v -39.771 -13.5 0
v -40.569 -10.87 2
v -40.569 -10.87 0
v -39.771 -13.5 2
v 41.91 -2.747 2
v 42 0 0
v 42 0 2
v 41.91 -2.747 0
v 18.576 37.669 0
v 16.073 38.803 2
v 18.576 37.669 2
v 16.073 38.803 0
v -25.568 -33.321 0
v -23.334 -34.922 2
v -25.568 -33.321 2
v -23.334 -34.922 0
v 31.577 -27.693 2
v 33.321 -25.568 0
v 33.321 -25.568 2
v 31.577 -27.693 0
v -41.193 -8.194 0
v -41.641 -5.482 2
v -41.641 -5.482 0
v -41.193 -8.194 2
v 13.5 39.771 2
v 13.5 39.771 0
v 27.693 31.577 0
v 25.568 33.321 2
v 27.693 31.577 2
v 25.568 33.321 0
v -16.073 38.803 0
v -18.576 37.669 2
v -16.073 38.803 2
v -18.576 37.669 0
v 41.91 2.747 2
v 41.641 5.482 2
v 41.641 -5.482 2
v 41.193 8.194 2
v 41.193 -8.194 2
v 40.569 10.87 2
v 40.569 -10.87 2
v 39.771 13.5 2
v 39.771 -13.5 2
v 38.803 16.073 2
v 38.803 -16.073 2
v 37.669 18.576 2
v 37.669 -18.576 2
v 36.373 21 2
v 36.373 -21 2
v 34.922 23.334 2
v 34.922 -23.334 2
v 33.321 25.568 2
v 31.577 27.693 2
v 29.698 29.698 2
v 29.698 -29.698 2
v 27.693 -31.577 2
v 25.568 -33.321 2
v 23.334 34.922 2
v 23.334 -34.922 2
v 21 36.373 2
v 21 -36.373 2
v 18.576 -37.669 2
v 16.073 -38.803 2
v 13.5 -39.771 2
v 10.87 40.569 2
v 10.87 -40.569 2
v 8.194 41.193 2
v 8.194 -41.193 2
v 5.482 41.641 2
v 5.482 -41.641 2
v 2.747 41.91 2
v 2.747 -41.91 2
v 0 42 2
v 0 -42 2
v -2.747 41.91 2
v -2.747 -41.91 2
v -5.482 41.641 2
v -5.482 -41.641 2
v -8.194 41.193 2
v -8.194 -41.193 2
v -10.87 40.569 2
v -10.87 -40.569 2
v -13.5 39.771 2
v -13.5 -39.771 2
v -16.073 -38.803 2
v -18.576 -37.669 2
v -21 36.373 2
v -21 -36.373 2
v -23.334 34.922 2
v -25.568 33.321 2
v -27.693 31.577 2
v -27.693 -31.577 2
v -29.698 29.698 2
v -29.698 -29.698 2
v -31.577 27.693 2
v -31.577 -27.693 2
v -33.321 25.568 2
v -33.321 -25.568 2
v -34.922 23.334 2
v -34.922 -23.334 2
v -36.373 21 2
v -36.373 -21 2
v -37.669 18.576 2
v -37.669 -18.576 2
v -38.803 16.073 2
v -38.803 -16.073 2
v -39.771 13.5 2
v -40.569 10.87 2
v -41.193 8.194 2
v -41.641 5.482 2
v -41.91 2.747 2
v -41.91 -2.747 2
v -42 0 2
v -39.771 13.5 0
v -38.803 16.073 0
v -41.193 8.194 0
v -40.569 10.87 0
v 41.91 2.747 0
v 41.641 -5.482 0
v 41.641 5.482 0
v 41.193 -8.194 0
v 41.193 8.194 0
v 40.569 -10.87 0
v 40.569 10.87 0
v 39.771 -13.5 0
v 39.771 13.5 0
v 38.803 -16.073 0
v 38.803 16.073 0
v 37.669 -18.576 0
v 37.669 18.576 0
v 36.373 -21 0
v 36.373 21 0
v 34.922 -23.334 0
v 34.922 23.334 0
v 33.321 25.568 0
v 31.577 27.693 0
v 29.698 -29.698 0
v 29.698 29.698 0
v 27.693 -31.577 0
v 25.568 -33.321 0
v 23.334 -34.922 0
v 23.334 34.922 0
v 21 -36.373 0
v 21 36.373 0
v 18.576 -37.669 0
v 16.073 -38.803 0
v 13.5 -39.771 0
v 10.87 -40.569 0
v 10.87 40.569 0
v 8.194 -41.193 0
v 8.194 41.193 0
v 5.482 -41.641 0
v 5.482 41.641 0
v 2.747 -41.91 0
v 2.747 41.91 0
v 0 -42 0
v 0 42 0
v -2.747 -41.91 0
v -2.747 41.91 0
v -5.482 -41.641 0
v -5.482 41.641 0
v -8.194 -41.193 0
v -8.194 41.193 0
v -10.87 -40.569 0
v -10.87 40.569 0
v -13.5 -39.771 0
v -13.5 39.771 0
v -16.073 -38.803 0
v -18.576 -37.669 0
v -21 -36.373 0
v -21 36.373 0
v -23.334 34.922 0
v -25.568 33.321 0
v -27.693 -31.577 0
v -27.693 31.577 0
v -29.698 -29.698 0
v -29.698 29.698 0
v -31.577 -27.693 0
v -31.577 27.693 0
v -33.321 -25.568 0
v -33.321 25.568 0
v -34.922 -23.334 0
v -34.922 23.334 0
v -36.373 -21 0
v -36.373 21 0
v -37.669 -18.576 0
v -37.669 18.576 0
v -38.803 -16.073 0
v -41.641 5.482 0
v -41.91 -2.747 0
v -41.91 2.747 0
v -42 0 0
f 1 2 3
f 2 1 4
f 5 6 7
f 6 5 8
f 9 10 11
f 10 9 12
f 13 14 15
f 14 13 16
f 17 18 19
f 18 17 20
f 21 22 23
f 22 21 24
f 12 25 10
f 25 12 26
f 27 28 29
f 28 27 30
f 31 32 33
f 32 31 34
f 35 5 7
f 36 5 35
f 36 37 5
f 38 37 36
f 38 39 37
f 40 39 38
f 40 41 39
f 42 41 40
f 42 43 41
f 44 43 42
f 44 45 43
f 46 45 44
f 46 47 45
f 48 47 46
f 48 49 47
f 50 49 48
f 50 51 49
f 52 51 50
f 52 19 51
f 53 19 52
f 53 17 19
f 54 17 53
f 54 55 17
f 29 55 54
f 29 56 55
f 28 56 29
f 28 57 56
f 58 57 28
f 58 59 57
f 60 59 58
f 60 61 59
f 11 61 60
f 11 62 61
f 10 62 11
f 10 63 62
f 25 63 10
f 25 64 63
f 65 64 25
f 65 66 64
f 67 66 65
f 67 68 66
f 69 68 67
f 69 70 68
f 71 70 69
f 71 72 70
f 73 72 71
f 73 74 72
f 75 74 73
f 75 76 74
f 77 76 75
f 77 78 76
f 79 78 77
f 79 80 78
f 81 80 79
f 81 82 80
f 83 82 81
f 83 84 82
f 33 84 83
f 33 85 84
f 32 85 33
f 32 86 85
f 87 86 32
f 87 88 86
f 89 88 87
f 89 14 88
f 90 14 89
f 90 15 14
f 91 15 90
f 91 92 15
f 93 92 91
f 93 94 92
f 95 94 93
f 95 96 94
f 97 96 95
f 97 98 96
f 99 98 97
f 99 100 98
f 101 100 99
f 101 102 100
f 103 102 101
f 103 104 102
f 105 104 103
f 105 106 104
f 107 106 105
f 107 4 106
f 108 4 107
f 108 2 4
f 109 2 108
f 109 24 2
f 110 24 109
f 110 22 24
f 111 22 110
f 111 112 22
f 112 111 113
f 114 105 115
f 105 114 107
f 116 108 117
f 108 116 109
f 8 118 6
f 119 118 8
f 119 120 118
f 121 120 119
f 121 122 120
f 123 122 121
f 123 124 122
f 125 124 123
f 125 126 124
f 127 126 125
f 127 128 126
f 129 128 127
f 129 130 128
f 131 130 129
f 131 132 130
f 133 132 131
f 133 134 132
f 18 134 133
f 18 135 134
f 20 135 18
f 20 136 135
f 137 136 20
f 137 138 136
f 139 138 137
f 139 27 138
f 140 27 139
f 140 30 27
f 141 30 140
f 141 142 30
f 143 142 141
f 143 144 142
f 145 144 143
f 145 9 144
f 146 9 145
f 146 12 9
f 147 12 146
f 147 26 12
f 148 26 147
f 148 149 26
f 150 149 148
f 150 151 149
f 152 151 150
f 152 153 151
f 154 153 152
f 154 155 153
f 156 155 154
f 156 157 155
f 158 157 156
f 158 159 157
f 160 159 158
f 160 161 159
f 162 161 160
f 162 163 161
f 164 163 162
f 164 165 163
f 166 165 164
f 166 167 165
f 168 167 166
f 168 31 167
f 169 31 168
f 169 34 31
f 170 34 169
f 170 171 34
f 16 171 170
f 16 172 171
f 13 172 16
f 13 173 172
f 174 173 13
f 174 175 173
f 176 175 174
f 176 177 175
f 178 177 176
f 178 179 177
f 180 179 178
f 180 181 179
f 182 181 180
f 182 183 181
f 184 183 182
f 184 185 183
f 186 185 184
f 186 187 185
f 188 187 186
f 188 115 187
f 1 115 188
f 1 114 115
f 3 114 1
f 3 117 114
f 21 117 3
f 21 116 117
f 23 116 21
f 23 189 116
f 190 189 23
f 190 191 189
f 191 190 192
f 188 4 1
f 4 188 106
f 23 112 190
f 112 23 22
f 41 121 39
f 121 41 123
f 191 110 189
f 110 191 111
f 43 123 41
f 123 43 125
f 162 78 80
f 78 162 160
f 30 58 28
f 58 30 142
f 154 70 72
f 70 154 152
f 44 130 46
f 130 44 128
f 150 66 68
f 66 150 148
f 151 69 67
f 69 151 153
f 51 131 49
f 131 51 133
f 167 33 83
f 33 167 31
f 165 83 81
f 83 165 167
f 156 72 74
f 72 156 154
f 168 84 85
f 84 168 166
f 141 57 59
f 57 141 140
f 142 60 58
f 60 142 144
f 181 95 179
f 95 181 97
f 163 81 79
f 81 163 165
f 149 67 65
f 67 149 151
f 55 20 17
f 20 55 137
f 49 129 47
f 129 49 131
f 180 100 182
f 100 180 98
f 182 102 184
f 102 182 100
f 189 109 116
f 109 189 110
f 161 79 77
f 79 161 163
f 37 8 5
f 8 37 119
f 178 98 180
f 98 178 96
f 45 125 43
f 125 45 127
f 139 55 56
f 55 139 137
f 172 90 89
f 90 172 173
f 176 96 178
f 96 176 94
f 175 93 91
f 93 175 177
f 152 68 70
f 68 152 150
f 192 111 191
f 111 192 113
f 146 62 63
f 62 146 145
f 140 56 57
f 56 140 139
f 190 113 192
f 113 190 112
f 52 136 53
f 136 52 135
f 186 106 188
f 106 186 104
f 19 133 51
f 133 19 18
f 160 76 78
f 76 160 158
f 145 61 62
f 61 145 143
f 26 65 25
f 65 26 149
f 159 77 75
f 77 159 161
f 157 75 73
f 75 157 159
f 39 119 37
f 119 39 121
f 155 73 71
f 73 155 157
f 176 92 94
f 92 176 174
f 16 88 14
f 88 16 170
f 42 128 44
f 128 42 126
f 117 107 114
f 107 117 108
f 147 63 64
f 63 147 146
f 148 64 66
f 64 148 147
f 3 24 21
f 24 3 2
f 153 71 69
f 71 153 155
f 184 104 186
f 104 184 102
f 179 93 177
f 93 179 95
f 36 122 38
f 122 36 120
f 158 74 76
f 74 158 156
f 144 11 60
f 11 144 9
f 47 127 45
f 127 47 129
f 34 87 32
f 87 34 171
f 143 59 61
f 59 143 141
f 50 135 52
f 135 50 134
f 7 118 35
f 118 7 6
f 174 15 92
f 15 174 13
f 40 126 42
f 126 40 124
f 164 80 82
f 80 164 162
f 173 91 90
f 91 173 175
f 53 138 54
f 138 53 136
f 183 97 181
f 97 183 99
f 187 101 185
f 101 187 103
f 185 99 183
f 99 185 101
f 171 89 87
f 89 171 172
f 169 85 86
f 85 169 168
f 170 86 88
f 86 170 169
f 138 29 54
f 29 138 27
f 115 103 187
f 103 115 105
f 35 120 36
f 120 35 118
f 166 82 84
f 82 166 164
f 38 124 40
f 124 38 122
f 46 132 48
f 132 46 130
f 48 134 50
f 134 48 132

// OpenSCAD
// file: random_maze_generator.scad
use <2d.scad>;

rows = 10; 
columns = 10; 
wall_thickness = 2;
wall_height = 5;
block_width = 5;


/*
 * constants, for clearness
 *
 */
 
// random directions, for picking up a direction to visit the next block
function PERMUTATION_OF_FOUR() = [
    [1, 2, 3, 4],
    [1, 2, 4, 3],
    [1, 3, 2, 4],
    [1, 3, 4, 2],
    [1, 4, 2, 3],
    [1, 4, 3, 2],
    [2, 1, 3, 4],
    [2, 1, 4, 3],
    [2, 3, 1, 4],
    [2, 3, 4, 1],
    [2, 4, 1, 3],
    [2, 4, 3, 1],
    [3, 1, 2, 4],
    [3, 1, 4, 2],
    [3, 2, 1, 4],
    [3, 2, 4, 1],
    [3, 4, 1, 2],
    [3, 4, 2, 1],
    [4, 1, 2, 3],
    [4, 1, 3, 2],
    [4, 2, 1, 3],
    [4, 2, 3, 1],
    [4, 3, 1, 2],
    [4, 3, 2, 1]
];

function NO_WALL() = 0;
function UP_WALL() = 1;
function RIGHT_WALL() = 2;
function UP_RIGHT_WALL() = 3;

function NOT_VISITED() = 0;
function VISITED() = 1;

/* 
 * modules for creating a maze
 *
 */

// create the outer wall of maze
module maze_outer_wall(rows, columns, block_width = 5, wall_thickness = 1) {
    x_line([0, rows * block_width], columns * block_width, wall_thickness);
    y_line([0, block_width], (rows - 1) * block_width, wall_thickness);
}

// create the inner wall of maze
module maze_inner_wall(maze, block_width = 5, wall_thickness = 1) {
    for(i = [0:len(maze) - 1]) {
        cord = maze[i];
        x = (cord[0] - 1) * block_width;
        y = (cord[1] - 1) * block_width;
        v = cord[3];
        
        if(v == 1 || v == 3) {
            x_line([x, y], block_width, wall_thickness);
        }
        if(v == 2 || v == 3) {
            y_line([x + block_width, y], block_width, wall_thickness);
        }
    }  
}

// create a maze
module maze(rows, columns, maze_vector, block_width = 5, wall_thickness = 1) {
     maze_outer_wall(rows, columns, block_width, wall_thickness);
     maze_inner_wall(maze_vector, block_width, wall_thickness);
}

/* 
 * utilities functions
 *
 */

// comare the equality of [x1, y1] and [x2, y2]
function cord_equals(cord1, cord2) = cord1 == cord2;

// is the point visited?
function not_visited(cord, vs, index = 0) =
    index == len(vs) ? true : 
        (cord_equals([vs[index][0], vs[index][1]], cord) && vs[index][2] == 1 ? false :
            not_visited(cord, vs, index + 1));
            
// pick a direction randomly
function rand_dirs() =
    PERMUTATION_OF_FOUR()[round(rands(0, 24, 1)[0])]; 

// give a index (exclusivly), slice a vector 
function head_to(i, vs) =
    i >= len(vs) ? vs : (
        i == 0 ? [] : concat(head_to(i - 1, vs), [vs[i - 1]])
    );

// give a index (exclusivly), slice a vector 
function tail_from(i, vs, index = 0, new_vs = []) =
    i >= len(vs) ? [] : (
        index < i ? tail_from(i, vs, index + 1) : (
            index < len(vs) ? tail_from(i, vs, index + 1, concat(new_vs, [vs[index]])) : new_vs
        )
    );

// replace v1 in the vector with v2 
function replace(v1, v2, vs, index = 0) =
    index == len(vs) ? vs : (
        vs[index] == v1 ? concat(concat(head_to(index, vs), [v2]), tail_from(index + 1, vs)) : replace(v1, v2, vs, index + 1)
    );
    
/* 
 * functions for generating a maze vector
 *
 */

// initialize rows of a maze
function init_row(n, length) =
    length == 0 ? [] : concat(init_row(n, length - 1), [[length, n, 0, UP_RIGHT_WALL()]]);
    
// initialize a maze
function init_maze(rows, columns) =
    rows == 0 ? [] : concat(init_maze(rows - 1, columns), init_row(rows, columns));
    
// find a vector in the maze vector
function find(i, j, maze_vector, index = 0) =
    index == len(maze_vector) ? [] : (
        cord_equals([i, j], [maze_vector[index][0], maze_vector[index][1]]) ? maze_vector[index] : find(i, j, maze_vector, index + 1)
    );

////
// NO_WALL = 0;
// UP_WALL = 1;
// RIGHT_WALL = 2;
// UP_RIGHT_WALL = 3;
function delete_right_wall(original_block) = 
    original_block == NO_WALL() || original_block == RIGHT_WALL() ? NO_WALL() : UP_WALL();

function delete_up_wall(original_block) = 
    (original_block == NO_WALL() || original_block == UP_WALL()) ? NO_WALL() : RIGHT_WALL();
    
function delete_right_wall_of(vs, is_visited, maze_vector) =
    replace(vs, [vs[0], vs[1] , is_visited, delete_right_wall(vs[3])] ,maze_vector);

function delete_up_wall_of(vs, is_visited, maze_vector) =
    replace(vs, [vs[0], vs[1] , is_visited, delete_up_wall(vs[3])] ,maze_vector);

function go_right(i, j, rows, columns, maze_vector) =
    go_maze(i + 1, j, rows, columns, delete_right_wall_of(find(i, j, maze_vector), VISITED(), maze_vector));
    
function go_up(i, j, rows, columns, maze_vector) =
    go_maze(i, j - 1, rows, columns, delete_up_wall_of(find(i, j, maze_vector), VISITED(), maze_vector));
    
function visit(v, maze_vector) =
    replace(v, [v[0], v[1], VISITED(), v[3]], maze_vector);
 
function go_left(i, j, rows, columns, maze_vector) =
    go_maze(i - 1, j, rows, columns, delete_right_wall_of(find(i - 1, j, maze_vector), NOT_VISITED(), maze_vector));
    
function go_down(i, j, rows, columns, maze_vector) =
    go_maze(i, j + 1, rows, columns, delete_up_wall_of(find(i, j + 1, maze_vector), NOT_VISITED(), maze_vector));
    
function go_maze(i, j, rows, columns, maze_vector) =
    look_around(i, j, rand_dirs(), rows, columns, visit(find(i, j, maze_vector), maze_vector));
    
function look_around(i, j, dirs, rows, columns, maze_vector, index = 0) =
    index == 4 ? maze_vector : 
        look_around( 
            i, j, dirs, 
            rows, columns, 
            build_wall(i, j, dirs[index], rows, columns, maze_vector), 
            index + 1
        ); 

function build_wall(i, j, n, rows, columns, maze_vector) = 
    n == 1 && i != columns && not_visited([i + 1, j], maze_vector) ? go_right(i, j, rows, columns, maze_vector) : ( 
        n == 2 && j != 1 && not_visited([i, j - 1], maze_vector) ? go_up(i, j, rows, columns, maze_vector)  : (
            n == 3 && i != 1 && not_visited([i - 1, j], maze_vector) ? go_left(i, j,rows, columns,  maze_vector)  : (
                n == 4 && j != rows && not_visited([i, j + 1], maze_vector) ? go_down(i, j, rows, columns, maze_vector) : maze_vector
            ) 
        )
    ); 
 
/*
 * create a maze
 *
 */
maze_vector = go_maze(1, 1, rows, columns, replace([columns, rows, 0, UP_RIGHT_WALL()], [columns, rows, 0, UP_WALL()], init_maze(rows, columns)));
linear_extrude(wall_height) 
    maze(rows, columns, maze_vector, block_width, wall_thickness);
// file: 2d.scad
function PI() = 3.14159;

// give a [x, y] point and length. draw a line in the x direction
module x_line(point, length, thickness = 1) {
    offset = thickness / 2;
    translate([point[0] - offset, point[1] - offset, 0]) 
        square([length + thickness, thickness]);
}

// give a [x, y] point and length. draw a line in the y direction
module y_line(point, length, thickness = 1) {
    offset = thickness / 2;
    translate([point[0] - offset, point[1] - offset, 0])  
        square([thickness, length + thickness]);
}

module a_quarter_arc(radius, angle, width = 1) {
    outer = radius + width;
    intersection() {
        difference() {
            offset(r = width) circle(radius, $fn=96); 
            circle(radius, $fn=96);
        }
        polygon([[0, 0], [outer, 0], [outer, outer * sin(angle)], [outer * cos(angle), outer * sin(angle)]]);
    }
}

module arc(radius, angles, width = 1) {
    angle_from = angles[0];
    angle_to = angles[1];
    angle_difference = angle_to - angle_from;
    outer = radius + width;
    rotate(angle_from)
        if(angle_difference <= 90) {
            a_quarter_arc(radius, angle_difference, width);
        } else if(angle_difference > 90 && angle_difference <= 180) {
            arc(radius, [0, 90], width);
            rotate(90) a_quarter_arc(radius, angle_difference - 90, width);
        } else if(angle_difference > 180 && angle_difference <= 270) {
            arc(radius, [0, 180], width);
            rotate(180) a_quarter_arc(radius, angle_difference - 180, width);
        } else if(angle_difference > 270 && angle_difference <= 360) {
            arc(radius, [0, 270], width);
            rotate(270) a_quarter_arc(radius, angle_difference - 270, width);
       }
}
// main file
use <2d.scad>;
use <random_maze_generator.scad>;

radius = 40; 

wall_height = 2;
wall_thickness = 2; 

cblocks = 25; 
rblocks = 5;

bottom = "YES";

module circle_maze(radius, cblocks, rblocks, thickness = 1) {
    full_circle_angle = 360;
    arc_angle = full_circle_angle / cblocks;
	length_rblock = radius / (rblocks + 2);
	
	maze = go_maze(1, 1, cblocks, rblocks, replace([rblocks, cblocks, 0, UP_RIGHT_WALL()], [rblocks, cblocks, 0, UP_WALL()], init_maze(cblocks, rblocks)));
	
	// inner circle
	rotate([0, 0, 180]) 
	    arc(length_rblock, [0, full_circle_angle - arc_angle], thickness);		
		
	rotate([0, 0, 315]) 	
	    x_line([length_rblock + thickness / 2, 0], length_rblock, thickness); 
		
	rotate([0, 0, arc_angle]) 
	    arc(length_rblock * 2, [0, full_circle_angle - arc_angle], thickness);
	
	// maze
    for(i = [0:len(maze) - 1]) { 
        cord = maze[i];
		cr = cord[0] + 2; 
		cc = cord[1] - 1;
        v = cord[3];
        
        if(v == 1 || v == 3) {
		    rotate([0, 0, cc * arc_angle])
                x_line([(cr - 1)* length_rblock + thickness / 2, 0], length_rblock, thickness); 
        }
        if(v == 2 || v == 3) {
		    rotate([0, 0, cc * arc_angle])
		        arc(cr * length_rblock, [0, arc_angle], thickness);
        } 
		if(v == 0 || v == 1) {
		    r1 = length_rblock * 2;
			r2 = cr * length_rblock;
		    rotate([0, 0, cc * arc_angle])
		        arc(cr * length_rblock, [0, arc_angle * (r2 - r1) / r2], thickness);
		}
    }  	
}

if(bottom == "YES")	{
	linear_extrude(wall_thickness)
	    circle(radius + wall_thickness, $fn = 96);		
}

linear_extrude(wall_height + wall_thickness) 
    circle_maze(radius, cblocks, rblocks, wall_thickness);
	

 
 
